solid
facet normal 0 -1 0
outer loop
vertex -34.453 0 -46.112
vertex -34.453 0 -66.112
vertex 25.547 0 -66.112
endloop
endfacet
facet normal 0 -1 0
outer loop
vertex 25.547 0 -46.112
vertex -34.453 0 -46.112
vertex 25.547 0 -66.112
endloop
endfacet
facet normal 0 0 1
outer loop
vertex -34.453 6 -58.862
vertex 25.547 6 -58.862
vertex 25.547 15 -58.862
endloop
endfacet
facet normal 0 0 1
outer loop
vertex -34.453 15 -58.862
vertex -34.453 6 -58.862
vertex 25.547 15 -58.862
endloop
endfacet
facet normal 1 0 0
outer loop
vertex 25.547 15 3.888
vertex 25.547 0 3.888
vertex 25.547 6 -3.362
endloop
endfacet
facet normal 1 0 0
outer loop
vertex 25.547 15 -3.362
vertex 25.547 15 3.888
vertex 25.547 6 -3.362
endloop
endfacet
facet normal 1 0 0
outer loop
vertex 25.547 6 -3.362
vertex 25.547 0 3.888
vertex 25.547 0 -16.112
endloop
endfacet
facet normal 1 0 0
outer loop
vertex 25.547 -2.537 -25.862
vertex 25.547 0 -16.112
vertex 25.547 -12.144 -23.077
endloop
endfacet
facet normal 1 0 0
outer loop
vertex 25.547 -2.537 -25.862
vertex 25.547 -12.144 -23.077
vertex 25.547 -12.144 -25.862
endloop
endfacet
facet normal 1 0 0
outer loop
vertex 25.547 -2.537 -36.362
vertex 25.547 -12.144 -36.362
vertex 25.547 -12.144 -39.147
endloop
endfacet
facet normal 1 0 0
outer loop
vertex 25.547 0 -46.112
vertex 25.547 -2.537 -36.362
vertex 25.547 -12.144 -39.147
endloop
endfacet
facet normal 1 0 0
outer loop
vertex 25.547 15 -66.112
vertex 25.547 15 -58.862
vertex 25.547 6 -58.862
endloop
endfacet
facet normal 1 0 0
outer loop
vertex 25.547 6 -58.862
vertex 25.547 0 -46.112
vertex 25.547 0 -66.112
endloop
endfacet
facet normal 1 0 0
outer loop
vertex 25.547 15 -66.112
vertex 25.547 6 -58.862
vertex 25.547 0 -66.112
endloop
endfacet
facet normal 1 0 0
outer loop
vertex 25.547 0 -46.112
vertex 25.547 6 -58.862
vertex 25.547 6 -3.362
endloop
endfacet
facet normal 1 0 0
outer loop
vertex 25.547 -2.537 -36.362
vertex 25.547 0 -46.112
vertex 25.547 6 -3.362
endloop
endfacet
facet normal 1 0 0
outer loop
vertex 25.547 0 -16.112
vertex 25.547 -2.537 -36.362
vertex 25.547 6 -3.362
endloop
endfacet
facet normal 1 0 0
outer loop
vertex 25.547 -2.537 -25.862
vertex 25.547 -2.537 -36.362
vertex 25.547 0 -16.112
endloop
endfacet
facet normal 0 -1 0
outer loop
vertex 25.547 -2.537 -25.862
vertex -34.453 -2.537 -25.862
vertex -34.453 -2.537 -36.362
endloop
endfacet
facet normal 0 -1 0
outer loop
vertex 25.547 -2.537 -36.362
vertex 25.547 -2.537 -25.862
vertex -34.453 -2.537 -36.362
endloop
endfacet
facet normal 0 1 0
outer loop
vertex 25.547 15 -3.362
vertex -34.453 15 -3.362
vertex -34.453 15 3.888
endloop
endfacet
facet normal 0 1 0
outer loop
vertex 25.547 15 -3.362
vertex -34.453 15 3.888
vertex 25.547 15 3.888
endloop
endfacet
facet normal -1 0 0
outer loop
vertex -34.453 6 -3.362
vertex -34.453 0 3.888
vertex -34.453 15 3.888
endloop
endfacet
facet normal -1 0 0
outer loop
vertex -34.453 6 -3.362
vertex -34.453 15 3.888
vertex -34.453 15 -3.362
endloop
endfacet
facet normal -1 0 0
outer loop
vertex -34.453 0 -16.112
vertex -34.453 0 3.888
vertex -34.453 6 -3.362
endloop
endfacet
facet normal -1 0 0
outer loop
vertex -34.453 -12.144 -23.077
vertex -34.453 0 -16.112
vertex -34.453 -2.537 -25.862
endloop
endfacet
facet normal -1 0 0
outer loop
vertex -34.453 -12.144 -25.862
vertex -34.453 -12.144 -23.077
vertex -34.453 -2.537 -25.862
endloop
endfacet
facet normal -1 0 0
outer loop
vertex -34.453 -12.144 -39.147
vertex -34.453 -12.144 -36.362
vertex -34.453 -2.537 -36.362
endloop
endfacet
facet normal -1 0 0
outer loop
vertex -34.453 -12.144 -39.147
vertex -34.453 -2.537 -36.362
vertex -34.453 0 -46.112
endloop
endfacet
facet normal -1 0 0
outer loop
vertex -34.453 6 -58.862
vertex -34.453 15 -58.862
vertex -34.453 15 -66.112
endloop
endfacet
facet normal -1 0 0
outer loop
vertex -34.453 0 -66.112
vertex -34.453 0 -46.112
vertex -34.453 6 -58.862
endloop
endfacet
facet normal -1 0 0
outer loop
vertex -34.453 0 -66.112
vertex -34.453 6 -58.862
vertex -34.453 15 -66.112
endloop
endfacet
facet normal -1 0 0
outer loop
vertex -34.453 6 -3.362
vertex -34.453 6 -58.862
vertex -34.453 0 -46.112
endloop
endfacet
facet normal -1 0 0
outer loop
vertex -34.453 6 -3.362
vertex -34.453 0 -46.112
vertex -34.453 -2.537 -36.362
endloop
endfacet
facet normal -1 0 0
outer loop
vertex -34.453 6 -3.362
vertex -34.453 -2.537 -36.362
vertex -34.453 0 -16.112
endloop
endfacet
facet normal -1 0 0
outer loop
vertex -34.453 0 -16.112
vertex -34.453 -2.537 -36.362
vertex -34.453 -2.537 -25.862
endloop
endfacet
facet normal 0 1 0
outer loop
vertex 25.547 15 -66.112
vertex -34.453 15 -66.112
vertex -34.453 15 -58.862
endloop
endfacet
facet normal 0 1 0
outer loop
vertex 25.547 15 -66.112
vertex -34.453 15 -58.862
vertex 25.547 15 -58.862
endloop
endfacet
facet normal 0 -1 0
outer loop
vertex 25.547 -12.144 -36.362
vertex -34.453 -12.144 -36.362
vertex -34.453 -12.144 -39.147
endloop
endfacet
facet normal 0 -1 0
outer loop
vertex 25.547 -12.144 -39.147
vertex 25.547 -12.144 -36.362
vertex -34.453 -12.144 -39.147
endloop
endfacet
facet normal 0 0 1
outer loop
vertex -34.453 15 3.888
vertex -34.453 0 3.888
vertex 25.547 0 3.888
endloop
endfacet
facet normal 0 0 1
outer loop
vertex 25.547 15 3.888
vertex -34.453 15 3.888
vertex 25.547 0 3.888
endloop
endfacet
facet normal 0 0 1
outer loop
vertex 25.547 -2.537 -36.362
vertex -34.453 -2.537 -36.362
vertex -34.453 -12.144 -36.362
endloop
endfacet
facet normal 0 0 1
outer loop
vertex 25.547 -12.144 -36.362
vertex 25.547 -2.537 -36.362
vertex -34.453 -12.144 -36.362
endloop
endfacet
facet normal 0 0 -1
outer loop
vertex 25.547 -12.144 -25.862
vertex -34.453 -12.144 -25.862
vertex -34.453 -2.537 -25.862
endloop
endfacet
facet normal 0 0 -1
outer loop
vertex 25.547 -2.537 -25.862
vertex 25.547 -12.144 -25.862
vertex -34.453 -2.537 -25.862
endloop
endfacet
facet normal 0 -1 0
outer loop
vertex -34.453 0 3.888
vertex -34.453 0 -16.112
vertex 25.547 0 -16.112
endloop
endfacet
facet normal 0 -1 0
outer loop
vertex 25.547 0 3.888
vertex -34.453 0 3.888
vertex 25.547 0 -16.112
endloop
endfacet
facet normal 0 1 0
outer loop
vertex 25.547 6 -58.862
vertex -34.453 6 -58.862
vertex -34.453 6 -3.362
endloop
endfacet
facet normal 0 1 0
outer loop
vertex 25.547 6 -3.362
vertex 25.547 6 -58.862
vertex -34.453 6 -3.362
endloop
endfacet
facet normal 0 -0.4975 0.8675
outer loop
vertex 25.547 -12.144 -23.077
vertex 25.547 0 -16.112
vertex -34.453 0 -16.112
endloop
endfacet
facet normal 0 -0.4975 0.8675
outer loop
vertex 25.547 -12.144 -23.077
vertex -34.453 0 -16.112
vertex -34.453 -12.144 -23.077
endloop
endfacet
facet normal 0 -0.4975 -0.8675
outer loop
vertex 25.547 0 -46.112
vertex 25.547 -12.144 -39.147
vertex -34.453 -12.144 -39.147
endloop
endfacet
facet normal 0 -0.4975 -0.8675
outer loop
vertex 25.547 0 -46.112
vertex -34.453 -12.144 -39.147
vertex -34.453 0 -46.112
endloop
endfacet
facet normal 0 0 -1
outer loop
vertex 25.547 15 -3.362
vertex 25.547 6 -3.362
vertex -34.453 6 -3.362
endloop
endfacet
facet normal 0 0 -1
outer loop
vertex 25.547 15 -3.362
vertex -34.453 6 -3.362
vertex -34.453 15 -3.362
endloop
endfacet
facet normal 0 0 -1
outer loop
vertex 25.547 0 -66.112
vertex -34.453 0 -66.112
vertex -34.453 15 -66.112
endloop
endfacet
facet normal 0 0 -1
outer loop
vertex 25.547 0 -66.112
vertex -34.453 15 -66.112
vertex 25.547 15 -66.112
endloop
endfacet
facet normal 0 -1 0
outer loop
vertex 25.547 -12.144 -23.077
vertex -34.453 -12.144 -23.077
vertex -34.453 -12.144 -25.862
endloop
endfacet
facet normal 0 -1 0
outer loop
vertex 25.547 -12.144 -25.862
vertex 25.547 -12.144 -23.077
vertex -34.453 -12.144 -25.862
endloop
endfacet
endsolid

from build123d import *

# Parameters (mm, degrees)
SKETCH_2_W          = 60
SKETCH_2_H          = 70
EXTRUDE_1_DEPTH     = 15
SKETCH_7_W          = 55.5
SKETCH_7_H          = 9
CUT_EXTRUDE_3_DEPTH = 91.530456977
EXTRUDE_3_DEPTH     = 60


with BuildPart() as part:
    # 草图2 → 凸台-拉伸1 (new body)
    with BuildSketch(Plane(origin=(0, 0, 0), x_dir=(1, 0, 0), z_dir=(0, 1, 0))):
        with Locations((-4.452764977, 31.111751152)):
            Rectangle(SKETCH_2_W, SKETCH_2_H)
    extrude(amount=EXTRUDE_1_DEPTH)

    # 草图7 → 切除-拉伸3 (cut, through all)
    with BuildSketch(Plane.ZY.offset(34.452764977)):
        with Locations((-31.111751152, 10.5)):
            Rectangle(SKETCH_7_W, SKETCH_7_H)
    extrude(amount=-CUT_EXTRUDE_3_DEPTH, mode=Mode.SUBTRACT)

    # 草图8 → 凸台-拉伸3 (add)
    with BuildSketch(Plane.ZY.offset(34.452764977)):
        Polygon((-46.111751152, 0), (-16.111751152, 0), (-23.076751152, -12.144495667), (-25.861751152, -12.144495667), (-25.861751152, -2.537373778), (-36.361751152, -2.537373778), (-36.361751152, -12.144495667), (-39.146751152, -12.144495667), align=None)
    extrude(amount=-EXTRUDE_3_DEPTH)


solid = part.part
